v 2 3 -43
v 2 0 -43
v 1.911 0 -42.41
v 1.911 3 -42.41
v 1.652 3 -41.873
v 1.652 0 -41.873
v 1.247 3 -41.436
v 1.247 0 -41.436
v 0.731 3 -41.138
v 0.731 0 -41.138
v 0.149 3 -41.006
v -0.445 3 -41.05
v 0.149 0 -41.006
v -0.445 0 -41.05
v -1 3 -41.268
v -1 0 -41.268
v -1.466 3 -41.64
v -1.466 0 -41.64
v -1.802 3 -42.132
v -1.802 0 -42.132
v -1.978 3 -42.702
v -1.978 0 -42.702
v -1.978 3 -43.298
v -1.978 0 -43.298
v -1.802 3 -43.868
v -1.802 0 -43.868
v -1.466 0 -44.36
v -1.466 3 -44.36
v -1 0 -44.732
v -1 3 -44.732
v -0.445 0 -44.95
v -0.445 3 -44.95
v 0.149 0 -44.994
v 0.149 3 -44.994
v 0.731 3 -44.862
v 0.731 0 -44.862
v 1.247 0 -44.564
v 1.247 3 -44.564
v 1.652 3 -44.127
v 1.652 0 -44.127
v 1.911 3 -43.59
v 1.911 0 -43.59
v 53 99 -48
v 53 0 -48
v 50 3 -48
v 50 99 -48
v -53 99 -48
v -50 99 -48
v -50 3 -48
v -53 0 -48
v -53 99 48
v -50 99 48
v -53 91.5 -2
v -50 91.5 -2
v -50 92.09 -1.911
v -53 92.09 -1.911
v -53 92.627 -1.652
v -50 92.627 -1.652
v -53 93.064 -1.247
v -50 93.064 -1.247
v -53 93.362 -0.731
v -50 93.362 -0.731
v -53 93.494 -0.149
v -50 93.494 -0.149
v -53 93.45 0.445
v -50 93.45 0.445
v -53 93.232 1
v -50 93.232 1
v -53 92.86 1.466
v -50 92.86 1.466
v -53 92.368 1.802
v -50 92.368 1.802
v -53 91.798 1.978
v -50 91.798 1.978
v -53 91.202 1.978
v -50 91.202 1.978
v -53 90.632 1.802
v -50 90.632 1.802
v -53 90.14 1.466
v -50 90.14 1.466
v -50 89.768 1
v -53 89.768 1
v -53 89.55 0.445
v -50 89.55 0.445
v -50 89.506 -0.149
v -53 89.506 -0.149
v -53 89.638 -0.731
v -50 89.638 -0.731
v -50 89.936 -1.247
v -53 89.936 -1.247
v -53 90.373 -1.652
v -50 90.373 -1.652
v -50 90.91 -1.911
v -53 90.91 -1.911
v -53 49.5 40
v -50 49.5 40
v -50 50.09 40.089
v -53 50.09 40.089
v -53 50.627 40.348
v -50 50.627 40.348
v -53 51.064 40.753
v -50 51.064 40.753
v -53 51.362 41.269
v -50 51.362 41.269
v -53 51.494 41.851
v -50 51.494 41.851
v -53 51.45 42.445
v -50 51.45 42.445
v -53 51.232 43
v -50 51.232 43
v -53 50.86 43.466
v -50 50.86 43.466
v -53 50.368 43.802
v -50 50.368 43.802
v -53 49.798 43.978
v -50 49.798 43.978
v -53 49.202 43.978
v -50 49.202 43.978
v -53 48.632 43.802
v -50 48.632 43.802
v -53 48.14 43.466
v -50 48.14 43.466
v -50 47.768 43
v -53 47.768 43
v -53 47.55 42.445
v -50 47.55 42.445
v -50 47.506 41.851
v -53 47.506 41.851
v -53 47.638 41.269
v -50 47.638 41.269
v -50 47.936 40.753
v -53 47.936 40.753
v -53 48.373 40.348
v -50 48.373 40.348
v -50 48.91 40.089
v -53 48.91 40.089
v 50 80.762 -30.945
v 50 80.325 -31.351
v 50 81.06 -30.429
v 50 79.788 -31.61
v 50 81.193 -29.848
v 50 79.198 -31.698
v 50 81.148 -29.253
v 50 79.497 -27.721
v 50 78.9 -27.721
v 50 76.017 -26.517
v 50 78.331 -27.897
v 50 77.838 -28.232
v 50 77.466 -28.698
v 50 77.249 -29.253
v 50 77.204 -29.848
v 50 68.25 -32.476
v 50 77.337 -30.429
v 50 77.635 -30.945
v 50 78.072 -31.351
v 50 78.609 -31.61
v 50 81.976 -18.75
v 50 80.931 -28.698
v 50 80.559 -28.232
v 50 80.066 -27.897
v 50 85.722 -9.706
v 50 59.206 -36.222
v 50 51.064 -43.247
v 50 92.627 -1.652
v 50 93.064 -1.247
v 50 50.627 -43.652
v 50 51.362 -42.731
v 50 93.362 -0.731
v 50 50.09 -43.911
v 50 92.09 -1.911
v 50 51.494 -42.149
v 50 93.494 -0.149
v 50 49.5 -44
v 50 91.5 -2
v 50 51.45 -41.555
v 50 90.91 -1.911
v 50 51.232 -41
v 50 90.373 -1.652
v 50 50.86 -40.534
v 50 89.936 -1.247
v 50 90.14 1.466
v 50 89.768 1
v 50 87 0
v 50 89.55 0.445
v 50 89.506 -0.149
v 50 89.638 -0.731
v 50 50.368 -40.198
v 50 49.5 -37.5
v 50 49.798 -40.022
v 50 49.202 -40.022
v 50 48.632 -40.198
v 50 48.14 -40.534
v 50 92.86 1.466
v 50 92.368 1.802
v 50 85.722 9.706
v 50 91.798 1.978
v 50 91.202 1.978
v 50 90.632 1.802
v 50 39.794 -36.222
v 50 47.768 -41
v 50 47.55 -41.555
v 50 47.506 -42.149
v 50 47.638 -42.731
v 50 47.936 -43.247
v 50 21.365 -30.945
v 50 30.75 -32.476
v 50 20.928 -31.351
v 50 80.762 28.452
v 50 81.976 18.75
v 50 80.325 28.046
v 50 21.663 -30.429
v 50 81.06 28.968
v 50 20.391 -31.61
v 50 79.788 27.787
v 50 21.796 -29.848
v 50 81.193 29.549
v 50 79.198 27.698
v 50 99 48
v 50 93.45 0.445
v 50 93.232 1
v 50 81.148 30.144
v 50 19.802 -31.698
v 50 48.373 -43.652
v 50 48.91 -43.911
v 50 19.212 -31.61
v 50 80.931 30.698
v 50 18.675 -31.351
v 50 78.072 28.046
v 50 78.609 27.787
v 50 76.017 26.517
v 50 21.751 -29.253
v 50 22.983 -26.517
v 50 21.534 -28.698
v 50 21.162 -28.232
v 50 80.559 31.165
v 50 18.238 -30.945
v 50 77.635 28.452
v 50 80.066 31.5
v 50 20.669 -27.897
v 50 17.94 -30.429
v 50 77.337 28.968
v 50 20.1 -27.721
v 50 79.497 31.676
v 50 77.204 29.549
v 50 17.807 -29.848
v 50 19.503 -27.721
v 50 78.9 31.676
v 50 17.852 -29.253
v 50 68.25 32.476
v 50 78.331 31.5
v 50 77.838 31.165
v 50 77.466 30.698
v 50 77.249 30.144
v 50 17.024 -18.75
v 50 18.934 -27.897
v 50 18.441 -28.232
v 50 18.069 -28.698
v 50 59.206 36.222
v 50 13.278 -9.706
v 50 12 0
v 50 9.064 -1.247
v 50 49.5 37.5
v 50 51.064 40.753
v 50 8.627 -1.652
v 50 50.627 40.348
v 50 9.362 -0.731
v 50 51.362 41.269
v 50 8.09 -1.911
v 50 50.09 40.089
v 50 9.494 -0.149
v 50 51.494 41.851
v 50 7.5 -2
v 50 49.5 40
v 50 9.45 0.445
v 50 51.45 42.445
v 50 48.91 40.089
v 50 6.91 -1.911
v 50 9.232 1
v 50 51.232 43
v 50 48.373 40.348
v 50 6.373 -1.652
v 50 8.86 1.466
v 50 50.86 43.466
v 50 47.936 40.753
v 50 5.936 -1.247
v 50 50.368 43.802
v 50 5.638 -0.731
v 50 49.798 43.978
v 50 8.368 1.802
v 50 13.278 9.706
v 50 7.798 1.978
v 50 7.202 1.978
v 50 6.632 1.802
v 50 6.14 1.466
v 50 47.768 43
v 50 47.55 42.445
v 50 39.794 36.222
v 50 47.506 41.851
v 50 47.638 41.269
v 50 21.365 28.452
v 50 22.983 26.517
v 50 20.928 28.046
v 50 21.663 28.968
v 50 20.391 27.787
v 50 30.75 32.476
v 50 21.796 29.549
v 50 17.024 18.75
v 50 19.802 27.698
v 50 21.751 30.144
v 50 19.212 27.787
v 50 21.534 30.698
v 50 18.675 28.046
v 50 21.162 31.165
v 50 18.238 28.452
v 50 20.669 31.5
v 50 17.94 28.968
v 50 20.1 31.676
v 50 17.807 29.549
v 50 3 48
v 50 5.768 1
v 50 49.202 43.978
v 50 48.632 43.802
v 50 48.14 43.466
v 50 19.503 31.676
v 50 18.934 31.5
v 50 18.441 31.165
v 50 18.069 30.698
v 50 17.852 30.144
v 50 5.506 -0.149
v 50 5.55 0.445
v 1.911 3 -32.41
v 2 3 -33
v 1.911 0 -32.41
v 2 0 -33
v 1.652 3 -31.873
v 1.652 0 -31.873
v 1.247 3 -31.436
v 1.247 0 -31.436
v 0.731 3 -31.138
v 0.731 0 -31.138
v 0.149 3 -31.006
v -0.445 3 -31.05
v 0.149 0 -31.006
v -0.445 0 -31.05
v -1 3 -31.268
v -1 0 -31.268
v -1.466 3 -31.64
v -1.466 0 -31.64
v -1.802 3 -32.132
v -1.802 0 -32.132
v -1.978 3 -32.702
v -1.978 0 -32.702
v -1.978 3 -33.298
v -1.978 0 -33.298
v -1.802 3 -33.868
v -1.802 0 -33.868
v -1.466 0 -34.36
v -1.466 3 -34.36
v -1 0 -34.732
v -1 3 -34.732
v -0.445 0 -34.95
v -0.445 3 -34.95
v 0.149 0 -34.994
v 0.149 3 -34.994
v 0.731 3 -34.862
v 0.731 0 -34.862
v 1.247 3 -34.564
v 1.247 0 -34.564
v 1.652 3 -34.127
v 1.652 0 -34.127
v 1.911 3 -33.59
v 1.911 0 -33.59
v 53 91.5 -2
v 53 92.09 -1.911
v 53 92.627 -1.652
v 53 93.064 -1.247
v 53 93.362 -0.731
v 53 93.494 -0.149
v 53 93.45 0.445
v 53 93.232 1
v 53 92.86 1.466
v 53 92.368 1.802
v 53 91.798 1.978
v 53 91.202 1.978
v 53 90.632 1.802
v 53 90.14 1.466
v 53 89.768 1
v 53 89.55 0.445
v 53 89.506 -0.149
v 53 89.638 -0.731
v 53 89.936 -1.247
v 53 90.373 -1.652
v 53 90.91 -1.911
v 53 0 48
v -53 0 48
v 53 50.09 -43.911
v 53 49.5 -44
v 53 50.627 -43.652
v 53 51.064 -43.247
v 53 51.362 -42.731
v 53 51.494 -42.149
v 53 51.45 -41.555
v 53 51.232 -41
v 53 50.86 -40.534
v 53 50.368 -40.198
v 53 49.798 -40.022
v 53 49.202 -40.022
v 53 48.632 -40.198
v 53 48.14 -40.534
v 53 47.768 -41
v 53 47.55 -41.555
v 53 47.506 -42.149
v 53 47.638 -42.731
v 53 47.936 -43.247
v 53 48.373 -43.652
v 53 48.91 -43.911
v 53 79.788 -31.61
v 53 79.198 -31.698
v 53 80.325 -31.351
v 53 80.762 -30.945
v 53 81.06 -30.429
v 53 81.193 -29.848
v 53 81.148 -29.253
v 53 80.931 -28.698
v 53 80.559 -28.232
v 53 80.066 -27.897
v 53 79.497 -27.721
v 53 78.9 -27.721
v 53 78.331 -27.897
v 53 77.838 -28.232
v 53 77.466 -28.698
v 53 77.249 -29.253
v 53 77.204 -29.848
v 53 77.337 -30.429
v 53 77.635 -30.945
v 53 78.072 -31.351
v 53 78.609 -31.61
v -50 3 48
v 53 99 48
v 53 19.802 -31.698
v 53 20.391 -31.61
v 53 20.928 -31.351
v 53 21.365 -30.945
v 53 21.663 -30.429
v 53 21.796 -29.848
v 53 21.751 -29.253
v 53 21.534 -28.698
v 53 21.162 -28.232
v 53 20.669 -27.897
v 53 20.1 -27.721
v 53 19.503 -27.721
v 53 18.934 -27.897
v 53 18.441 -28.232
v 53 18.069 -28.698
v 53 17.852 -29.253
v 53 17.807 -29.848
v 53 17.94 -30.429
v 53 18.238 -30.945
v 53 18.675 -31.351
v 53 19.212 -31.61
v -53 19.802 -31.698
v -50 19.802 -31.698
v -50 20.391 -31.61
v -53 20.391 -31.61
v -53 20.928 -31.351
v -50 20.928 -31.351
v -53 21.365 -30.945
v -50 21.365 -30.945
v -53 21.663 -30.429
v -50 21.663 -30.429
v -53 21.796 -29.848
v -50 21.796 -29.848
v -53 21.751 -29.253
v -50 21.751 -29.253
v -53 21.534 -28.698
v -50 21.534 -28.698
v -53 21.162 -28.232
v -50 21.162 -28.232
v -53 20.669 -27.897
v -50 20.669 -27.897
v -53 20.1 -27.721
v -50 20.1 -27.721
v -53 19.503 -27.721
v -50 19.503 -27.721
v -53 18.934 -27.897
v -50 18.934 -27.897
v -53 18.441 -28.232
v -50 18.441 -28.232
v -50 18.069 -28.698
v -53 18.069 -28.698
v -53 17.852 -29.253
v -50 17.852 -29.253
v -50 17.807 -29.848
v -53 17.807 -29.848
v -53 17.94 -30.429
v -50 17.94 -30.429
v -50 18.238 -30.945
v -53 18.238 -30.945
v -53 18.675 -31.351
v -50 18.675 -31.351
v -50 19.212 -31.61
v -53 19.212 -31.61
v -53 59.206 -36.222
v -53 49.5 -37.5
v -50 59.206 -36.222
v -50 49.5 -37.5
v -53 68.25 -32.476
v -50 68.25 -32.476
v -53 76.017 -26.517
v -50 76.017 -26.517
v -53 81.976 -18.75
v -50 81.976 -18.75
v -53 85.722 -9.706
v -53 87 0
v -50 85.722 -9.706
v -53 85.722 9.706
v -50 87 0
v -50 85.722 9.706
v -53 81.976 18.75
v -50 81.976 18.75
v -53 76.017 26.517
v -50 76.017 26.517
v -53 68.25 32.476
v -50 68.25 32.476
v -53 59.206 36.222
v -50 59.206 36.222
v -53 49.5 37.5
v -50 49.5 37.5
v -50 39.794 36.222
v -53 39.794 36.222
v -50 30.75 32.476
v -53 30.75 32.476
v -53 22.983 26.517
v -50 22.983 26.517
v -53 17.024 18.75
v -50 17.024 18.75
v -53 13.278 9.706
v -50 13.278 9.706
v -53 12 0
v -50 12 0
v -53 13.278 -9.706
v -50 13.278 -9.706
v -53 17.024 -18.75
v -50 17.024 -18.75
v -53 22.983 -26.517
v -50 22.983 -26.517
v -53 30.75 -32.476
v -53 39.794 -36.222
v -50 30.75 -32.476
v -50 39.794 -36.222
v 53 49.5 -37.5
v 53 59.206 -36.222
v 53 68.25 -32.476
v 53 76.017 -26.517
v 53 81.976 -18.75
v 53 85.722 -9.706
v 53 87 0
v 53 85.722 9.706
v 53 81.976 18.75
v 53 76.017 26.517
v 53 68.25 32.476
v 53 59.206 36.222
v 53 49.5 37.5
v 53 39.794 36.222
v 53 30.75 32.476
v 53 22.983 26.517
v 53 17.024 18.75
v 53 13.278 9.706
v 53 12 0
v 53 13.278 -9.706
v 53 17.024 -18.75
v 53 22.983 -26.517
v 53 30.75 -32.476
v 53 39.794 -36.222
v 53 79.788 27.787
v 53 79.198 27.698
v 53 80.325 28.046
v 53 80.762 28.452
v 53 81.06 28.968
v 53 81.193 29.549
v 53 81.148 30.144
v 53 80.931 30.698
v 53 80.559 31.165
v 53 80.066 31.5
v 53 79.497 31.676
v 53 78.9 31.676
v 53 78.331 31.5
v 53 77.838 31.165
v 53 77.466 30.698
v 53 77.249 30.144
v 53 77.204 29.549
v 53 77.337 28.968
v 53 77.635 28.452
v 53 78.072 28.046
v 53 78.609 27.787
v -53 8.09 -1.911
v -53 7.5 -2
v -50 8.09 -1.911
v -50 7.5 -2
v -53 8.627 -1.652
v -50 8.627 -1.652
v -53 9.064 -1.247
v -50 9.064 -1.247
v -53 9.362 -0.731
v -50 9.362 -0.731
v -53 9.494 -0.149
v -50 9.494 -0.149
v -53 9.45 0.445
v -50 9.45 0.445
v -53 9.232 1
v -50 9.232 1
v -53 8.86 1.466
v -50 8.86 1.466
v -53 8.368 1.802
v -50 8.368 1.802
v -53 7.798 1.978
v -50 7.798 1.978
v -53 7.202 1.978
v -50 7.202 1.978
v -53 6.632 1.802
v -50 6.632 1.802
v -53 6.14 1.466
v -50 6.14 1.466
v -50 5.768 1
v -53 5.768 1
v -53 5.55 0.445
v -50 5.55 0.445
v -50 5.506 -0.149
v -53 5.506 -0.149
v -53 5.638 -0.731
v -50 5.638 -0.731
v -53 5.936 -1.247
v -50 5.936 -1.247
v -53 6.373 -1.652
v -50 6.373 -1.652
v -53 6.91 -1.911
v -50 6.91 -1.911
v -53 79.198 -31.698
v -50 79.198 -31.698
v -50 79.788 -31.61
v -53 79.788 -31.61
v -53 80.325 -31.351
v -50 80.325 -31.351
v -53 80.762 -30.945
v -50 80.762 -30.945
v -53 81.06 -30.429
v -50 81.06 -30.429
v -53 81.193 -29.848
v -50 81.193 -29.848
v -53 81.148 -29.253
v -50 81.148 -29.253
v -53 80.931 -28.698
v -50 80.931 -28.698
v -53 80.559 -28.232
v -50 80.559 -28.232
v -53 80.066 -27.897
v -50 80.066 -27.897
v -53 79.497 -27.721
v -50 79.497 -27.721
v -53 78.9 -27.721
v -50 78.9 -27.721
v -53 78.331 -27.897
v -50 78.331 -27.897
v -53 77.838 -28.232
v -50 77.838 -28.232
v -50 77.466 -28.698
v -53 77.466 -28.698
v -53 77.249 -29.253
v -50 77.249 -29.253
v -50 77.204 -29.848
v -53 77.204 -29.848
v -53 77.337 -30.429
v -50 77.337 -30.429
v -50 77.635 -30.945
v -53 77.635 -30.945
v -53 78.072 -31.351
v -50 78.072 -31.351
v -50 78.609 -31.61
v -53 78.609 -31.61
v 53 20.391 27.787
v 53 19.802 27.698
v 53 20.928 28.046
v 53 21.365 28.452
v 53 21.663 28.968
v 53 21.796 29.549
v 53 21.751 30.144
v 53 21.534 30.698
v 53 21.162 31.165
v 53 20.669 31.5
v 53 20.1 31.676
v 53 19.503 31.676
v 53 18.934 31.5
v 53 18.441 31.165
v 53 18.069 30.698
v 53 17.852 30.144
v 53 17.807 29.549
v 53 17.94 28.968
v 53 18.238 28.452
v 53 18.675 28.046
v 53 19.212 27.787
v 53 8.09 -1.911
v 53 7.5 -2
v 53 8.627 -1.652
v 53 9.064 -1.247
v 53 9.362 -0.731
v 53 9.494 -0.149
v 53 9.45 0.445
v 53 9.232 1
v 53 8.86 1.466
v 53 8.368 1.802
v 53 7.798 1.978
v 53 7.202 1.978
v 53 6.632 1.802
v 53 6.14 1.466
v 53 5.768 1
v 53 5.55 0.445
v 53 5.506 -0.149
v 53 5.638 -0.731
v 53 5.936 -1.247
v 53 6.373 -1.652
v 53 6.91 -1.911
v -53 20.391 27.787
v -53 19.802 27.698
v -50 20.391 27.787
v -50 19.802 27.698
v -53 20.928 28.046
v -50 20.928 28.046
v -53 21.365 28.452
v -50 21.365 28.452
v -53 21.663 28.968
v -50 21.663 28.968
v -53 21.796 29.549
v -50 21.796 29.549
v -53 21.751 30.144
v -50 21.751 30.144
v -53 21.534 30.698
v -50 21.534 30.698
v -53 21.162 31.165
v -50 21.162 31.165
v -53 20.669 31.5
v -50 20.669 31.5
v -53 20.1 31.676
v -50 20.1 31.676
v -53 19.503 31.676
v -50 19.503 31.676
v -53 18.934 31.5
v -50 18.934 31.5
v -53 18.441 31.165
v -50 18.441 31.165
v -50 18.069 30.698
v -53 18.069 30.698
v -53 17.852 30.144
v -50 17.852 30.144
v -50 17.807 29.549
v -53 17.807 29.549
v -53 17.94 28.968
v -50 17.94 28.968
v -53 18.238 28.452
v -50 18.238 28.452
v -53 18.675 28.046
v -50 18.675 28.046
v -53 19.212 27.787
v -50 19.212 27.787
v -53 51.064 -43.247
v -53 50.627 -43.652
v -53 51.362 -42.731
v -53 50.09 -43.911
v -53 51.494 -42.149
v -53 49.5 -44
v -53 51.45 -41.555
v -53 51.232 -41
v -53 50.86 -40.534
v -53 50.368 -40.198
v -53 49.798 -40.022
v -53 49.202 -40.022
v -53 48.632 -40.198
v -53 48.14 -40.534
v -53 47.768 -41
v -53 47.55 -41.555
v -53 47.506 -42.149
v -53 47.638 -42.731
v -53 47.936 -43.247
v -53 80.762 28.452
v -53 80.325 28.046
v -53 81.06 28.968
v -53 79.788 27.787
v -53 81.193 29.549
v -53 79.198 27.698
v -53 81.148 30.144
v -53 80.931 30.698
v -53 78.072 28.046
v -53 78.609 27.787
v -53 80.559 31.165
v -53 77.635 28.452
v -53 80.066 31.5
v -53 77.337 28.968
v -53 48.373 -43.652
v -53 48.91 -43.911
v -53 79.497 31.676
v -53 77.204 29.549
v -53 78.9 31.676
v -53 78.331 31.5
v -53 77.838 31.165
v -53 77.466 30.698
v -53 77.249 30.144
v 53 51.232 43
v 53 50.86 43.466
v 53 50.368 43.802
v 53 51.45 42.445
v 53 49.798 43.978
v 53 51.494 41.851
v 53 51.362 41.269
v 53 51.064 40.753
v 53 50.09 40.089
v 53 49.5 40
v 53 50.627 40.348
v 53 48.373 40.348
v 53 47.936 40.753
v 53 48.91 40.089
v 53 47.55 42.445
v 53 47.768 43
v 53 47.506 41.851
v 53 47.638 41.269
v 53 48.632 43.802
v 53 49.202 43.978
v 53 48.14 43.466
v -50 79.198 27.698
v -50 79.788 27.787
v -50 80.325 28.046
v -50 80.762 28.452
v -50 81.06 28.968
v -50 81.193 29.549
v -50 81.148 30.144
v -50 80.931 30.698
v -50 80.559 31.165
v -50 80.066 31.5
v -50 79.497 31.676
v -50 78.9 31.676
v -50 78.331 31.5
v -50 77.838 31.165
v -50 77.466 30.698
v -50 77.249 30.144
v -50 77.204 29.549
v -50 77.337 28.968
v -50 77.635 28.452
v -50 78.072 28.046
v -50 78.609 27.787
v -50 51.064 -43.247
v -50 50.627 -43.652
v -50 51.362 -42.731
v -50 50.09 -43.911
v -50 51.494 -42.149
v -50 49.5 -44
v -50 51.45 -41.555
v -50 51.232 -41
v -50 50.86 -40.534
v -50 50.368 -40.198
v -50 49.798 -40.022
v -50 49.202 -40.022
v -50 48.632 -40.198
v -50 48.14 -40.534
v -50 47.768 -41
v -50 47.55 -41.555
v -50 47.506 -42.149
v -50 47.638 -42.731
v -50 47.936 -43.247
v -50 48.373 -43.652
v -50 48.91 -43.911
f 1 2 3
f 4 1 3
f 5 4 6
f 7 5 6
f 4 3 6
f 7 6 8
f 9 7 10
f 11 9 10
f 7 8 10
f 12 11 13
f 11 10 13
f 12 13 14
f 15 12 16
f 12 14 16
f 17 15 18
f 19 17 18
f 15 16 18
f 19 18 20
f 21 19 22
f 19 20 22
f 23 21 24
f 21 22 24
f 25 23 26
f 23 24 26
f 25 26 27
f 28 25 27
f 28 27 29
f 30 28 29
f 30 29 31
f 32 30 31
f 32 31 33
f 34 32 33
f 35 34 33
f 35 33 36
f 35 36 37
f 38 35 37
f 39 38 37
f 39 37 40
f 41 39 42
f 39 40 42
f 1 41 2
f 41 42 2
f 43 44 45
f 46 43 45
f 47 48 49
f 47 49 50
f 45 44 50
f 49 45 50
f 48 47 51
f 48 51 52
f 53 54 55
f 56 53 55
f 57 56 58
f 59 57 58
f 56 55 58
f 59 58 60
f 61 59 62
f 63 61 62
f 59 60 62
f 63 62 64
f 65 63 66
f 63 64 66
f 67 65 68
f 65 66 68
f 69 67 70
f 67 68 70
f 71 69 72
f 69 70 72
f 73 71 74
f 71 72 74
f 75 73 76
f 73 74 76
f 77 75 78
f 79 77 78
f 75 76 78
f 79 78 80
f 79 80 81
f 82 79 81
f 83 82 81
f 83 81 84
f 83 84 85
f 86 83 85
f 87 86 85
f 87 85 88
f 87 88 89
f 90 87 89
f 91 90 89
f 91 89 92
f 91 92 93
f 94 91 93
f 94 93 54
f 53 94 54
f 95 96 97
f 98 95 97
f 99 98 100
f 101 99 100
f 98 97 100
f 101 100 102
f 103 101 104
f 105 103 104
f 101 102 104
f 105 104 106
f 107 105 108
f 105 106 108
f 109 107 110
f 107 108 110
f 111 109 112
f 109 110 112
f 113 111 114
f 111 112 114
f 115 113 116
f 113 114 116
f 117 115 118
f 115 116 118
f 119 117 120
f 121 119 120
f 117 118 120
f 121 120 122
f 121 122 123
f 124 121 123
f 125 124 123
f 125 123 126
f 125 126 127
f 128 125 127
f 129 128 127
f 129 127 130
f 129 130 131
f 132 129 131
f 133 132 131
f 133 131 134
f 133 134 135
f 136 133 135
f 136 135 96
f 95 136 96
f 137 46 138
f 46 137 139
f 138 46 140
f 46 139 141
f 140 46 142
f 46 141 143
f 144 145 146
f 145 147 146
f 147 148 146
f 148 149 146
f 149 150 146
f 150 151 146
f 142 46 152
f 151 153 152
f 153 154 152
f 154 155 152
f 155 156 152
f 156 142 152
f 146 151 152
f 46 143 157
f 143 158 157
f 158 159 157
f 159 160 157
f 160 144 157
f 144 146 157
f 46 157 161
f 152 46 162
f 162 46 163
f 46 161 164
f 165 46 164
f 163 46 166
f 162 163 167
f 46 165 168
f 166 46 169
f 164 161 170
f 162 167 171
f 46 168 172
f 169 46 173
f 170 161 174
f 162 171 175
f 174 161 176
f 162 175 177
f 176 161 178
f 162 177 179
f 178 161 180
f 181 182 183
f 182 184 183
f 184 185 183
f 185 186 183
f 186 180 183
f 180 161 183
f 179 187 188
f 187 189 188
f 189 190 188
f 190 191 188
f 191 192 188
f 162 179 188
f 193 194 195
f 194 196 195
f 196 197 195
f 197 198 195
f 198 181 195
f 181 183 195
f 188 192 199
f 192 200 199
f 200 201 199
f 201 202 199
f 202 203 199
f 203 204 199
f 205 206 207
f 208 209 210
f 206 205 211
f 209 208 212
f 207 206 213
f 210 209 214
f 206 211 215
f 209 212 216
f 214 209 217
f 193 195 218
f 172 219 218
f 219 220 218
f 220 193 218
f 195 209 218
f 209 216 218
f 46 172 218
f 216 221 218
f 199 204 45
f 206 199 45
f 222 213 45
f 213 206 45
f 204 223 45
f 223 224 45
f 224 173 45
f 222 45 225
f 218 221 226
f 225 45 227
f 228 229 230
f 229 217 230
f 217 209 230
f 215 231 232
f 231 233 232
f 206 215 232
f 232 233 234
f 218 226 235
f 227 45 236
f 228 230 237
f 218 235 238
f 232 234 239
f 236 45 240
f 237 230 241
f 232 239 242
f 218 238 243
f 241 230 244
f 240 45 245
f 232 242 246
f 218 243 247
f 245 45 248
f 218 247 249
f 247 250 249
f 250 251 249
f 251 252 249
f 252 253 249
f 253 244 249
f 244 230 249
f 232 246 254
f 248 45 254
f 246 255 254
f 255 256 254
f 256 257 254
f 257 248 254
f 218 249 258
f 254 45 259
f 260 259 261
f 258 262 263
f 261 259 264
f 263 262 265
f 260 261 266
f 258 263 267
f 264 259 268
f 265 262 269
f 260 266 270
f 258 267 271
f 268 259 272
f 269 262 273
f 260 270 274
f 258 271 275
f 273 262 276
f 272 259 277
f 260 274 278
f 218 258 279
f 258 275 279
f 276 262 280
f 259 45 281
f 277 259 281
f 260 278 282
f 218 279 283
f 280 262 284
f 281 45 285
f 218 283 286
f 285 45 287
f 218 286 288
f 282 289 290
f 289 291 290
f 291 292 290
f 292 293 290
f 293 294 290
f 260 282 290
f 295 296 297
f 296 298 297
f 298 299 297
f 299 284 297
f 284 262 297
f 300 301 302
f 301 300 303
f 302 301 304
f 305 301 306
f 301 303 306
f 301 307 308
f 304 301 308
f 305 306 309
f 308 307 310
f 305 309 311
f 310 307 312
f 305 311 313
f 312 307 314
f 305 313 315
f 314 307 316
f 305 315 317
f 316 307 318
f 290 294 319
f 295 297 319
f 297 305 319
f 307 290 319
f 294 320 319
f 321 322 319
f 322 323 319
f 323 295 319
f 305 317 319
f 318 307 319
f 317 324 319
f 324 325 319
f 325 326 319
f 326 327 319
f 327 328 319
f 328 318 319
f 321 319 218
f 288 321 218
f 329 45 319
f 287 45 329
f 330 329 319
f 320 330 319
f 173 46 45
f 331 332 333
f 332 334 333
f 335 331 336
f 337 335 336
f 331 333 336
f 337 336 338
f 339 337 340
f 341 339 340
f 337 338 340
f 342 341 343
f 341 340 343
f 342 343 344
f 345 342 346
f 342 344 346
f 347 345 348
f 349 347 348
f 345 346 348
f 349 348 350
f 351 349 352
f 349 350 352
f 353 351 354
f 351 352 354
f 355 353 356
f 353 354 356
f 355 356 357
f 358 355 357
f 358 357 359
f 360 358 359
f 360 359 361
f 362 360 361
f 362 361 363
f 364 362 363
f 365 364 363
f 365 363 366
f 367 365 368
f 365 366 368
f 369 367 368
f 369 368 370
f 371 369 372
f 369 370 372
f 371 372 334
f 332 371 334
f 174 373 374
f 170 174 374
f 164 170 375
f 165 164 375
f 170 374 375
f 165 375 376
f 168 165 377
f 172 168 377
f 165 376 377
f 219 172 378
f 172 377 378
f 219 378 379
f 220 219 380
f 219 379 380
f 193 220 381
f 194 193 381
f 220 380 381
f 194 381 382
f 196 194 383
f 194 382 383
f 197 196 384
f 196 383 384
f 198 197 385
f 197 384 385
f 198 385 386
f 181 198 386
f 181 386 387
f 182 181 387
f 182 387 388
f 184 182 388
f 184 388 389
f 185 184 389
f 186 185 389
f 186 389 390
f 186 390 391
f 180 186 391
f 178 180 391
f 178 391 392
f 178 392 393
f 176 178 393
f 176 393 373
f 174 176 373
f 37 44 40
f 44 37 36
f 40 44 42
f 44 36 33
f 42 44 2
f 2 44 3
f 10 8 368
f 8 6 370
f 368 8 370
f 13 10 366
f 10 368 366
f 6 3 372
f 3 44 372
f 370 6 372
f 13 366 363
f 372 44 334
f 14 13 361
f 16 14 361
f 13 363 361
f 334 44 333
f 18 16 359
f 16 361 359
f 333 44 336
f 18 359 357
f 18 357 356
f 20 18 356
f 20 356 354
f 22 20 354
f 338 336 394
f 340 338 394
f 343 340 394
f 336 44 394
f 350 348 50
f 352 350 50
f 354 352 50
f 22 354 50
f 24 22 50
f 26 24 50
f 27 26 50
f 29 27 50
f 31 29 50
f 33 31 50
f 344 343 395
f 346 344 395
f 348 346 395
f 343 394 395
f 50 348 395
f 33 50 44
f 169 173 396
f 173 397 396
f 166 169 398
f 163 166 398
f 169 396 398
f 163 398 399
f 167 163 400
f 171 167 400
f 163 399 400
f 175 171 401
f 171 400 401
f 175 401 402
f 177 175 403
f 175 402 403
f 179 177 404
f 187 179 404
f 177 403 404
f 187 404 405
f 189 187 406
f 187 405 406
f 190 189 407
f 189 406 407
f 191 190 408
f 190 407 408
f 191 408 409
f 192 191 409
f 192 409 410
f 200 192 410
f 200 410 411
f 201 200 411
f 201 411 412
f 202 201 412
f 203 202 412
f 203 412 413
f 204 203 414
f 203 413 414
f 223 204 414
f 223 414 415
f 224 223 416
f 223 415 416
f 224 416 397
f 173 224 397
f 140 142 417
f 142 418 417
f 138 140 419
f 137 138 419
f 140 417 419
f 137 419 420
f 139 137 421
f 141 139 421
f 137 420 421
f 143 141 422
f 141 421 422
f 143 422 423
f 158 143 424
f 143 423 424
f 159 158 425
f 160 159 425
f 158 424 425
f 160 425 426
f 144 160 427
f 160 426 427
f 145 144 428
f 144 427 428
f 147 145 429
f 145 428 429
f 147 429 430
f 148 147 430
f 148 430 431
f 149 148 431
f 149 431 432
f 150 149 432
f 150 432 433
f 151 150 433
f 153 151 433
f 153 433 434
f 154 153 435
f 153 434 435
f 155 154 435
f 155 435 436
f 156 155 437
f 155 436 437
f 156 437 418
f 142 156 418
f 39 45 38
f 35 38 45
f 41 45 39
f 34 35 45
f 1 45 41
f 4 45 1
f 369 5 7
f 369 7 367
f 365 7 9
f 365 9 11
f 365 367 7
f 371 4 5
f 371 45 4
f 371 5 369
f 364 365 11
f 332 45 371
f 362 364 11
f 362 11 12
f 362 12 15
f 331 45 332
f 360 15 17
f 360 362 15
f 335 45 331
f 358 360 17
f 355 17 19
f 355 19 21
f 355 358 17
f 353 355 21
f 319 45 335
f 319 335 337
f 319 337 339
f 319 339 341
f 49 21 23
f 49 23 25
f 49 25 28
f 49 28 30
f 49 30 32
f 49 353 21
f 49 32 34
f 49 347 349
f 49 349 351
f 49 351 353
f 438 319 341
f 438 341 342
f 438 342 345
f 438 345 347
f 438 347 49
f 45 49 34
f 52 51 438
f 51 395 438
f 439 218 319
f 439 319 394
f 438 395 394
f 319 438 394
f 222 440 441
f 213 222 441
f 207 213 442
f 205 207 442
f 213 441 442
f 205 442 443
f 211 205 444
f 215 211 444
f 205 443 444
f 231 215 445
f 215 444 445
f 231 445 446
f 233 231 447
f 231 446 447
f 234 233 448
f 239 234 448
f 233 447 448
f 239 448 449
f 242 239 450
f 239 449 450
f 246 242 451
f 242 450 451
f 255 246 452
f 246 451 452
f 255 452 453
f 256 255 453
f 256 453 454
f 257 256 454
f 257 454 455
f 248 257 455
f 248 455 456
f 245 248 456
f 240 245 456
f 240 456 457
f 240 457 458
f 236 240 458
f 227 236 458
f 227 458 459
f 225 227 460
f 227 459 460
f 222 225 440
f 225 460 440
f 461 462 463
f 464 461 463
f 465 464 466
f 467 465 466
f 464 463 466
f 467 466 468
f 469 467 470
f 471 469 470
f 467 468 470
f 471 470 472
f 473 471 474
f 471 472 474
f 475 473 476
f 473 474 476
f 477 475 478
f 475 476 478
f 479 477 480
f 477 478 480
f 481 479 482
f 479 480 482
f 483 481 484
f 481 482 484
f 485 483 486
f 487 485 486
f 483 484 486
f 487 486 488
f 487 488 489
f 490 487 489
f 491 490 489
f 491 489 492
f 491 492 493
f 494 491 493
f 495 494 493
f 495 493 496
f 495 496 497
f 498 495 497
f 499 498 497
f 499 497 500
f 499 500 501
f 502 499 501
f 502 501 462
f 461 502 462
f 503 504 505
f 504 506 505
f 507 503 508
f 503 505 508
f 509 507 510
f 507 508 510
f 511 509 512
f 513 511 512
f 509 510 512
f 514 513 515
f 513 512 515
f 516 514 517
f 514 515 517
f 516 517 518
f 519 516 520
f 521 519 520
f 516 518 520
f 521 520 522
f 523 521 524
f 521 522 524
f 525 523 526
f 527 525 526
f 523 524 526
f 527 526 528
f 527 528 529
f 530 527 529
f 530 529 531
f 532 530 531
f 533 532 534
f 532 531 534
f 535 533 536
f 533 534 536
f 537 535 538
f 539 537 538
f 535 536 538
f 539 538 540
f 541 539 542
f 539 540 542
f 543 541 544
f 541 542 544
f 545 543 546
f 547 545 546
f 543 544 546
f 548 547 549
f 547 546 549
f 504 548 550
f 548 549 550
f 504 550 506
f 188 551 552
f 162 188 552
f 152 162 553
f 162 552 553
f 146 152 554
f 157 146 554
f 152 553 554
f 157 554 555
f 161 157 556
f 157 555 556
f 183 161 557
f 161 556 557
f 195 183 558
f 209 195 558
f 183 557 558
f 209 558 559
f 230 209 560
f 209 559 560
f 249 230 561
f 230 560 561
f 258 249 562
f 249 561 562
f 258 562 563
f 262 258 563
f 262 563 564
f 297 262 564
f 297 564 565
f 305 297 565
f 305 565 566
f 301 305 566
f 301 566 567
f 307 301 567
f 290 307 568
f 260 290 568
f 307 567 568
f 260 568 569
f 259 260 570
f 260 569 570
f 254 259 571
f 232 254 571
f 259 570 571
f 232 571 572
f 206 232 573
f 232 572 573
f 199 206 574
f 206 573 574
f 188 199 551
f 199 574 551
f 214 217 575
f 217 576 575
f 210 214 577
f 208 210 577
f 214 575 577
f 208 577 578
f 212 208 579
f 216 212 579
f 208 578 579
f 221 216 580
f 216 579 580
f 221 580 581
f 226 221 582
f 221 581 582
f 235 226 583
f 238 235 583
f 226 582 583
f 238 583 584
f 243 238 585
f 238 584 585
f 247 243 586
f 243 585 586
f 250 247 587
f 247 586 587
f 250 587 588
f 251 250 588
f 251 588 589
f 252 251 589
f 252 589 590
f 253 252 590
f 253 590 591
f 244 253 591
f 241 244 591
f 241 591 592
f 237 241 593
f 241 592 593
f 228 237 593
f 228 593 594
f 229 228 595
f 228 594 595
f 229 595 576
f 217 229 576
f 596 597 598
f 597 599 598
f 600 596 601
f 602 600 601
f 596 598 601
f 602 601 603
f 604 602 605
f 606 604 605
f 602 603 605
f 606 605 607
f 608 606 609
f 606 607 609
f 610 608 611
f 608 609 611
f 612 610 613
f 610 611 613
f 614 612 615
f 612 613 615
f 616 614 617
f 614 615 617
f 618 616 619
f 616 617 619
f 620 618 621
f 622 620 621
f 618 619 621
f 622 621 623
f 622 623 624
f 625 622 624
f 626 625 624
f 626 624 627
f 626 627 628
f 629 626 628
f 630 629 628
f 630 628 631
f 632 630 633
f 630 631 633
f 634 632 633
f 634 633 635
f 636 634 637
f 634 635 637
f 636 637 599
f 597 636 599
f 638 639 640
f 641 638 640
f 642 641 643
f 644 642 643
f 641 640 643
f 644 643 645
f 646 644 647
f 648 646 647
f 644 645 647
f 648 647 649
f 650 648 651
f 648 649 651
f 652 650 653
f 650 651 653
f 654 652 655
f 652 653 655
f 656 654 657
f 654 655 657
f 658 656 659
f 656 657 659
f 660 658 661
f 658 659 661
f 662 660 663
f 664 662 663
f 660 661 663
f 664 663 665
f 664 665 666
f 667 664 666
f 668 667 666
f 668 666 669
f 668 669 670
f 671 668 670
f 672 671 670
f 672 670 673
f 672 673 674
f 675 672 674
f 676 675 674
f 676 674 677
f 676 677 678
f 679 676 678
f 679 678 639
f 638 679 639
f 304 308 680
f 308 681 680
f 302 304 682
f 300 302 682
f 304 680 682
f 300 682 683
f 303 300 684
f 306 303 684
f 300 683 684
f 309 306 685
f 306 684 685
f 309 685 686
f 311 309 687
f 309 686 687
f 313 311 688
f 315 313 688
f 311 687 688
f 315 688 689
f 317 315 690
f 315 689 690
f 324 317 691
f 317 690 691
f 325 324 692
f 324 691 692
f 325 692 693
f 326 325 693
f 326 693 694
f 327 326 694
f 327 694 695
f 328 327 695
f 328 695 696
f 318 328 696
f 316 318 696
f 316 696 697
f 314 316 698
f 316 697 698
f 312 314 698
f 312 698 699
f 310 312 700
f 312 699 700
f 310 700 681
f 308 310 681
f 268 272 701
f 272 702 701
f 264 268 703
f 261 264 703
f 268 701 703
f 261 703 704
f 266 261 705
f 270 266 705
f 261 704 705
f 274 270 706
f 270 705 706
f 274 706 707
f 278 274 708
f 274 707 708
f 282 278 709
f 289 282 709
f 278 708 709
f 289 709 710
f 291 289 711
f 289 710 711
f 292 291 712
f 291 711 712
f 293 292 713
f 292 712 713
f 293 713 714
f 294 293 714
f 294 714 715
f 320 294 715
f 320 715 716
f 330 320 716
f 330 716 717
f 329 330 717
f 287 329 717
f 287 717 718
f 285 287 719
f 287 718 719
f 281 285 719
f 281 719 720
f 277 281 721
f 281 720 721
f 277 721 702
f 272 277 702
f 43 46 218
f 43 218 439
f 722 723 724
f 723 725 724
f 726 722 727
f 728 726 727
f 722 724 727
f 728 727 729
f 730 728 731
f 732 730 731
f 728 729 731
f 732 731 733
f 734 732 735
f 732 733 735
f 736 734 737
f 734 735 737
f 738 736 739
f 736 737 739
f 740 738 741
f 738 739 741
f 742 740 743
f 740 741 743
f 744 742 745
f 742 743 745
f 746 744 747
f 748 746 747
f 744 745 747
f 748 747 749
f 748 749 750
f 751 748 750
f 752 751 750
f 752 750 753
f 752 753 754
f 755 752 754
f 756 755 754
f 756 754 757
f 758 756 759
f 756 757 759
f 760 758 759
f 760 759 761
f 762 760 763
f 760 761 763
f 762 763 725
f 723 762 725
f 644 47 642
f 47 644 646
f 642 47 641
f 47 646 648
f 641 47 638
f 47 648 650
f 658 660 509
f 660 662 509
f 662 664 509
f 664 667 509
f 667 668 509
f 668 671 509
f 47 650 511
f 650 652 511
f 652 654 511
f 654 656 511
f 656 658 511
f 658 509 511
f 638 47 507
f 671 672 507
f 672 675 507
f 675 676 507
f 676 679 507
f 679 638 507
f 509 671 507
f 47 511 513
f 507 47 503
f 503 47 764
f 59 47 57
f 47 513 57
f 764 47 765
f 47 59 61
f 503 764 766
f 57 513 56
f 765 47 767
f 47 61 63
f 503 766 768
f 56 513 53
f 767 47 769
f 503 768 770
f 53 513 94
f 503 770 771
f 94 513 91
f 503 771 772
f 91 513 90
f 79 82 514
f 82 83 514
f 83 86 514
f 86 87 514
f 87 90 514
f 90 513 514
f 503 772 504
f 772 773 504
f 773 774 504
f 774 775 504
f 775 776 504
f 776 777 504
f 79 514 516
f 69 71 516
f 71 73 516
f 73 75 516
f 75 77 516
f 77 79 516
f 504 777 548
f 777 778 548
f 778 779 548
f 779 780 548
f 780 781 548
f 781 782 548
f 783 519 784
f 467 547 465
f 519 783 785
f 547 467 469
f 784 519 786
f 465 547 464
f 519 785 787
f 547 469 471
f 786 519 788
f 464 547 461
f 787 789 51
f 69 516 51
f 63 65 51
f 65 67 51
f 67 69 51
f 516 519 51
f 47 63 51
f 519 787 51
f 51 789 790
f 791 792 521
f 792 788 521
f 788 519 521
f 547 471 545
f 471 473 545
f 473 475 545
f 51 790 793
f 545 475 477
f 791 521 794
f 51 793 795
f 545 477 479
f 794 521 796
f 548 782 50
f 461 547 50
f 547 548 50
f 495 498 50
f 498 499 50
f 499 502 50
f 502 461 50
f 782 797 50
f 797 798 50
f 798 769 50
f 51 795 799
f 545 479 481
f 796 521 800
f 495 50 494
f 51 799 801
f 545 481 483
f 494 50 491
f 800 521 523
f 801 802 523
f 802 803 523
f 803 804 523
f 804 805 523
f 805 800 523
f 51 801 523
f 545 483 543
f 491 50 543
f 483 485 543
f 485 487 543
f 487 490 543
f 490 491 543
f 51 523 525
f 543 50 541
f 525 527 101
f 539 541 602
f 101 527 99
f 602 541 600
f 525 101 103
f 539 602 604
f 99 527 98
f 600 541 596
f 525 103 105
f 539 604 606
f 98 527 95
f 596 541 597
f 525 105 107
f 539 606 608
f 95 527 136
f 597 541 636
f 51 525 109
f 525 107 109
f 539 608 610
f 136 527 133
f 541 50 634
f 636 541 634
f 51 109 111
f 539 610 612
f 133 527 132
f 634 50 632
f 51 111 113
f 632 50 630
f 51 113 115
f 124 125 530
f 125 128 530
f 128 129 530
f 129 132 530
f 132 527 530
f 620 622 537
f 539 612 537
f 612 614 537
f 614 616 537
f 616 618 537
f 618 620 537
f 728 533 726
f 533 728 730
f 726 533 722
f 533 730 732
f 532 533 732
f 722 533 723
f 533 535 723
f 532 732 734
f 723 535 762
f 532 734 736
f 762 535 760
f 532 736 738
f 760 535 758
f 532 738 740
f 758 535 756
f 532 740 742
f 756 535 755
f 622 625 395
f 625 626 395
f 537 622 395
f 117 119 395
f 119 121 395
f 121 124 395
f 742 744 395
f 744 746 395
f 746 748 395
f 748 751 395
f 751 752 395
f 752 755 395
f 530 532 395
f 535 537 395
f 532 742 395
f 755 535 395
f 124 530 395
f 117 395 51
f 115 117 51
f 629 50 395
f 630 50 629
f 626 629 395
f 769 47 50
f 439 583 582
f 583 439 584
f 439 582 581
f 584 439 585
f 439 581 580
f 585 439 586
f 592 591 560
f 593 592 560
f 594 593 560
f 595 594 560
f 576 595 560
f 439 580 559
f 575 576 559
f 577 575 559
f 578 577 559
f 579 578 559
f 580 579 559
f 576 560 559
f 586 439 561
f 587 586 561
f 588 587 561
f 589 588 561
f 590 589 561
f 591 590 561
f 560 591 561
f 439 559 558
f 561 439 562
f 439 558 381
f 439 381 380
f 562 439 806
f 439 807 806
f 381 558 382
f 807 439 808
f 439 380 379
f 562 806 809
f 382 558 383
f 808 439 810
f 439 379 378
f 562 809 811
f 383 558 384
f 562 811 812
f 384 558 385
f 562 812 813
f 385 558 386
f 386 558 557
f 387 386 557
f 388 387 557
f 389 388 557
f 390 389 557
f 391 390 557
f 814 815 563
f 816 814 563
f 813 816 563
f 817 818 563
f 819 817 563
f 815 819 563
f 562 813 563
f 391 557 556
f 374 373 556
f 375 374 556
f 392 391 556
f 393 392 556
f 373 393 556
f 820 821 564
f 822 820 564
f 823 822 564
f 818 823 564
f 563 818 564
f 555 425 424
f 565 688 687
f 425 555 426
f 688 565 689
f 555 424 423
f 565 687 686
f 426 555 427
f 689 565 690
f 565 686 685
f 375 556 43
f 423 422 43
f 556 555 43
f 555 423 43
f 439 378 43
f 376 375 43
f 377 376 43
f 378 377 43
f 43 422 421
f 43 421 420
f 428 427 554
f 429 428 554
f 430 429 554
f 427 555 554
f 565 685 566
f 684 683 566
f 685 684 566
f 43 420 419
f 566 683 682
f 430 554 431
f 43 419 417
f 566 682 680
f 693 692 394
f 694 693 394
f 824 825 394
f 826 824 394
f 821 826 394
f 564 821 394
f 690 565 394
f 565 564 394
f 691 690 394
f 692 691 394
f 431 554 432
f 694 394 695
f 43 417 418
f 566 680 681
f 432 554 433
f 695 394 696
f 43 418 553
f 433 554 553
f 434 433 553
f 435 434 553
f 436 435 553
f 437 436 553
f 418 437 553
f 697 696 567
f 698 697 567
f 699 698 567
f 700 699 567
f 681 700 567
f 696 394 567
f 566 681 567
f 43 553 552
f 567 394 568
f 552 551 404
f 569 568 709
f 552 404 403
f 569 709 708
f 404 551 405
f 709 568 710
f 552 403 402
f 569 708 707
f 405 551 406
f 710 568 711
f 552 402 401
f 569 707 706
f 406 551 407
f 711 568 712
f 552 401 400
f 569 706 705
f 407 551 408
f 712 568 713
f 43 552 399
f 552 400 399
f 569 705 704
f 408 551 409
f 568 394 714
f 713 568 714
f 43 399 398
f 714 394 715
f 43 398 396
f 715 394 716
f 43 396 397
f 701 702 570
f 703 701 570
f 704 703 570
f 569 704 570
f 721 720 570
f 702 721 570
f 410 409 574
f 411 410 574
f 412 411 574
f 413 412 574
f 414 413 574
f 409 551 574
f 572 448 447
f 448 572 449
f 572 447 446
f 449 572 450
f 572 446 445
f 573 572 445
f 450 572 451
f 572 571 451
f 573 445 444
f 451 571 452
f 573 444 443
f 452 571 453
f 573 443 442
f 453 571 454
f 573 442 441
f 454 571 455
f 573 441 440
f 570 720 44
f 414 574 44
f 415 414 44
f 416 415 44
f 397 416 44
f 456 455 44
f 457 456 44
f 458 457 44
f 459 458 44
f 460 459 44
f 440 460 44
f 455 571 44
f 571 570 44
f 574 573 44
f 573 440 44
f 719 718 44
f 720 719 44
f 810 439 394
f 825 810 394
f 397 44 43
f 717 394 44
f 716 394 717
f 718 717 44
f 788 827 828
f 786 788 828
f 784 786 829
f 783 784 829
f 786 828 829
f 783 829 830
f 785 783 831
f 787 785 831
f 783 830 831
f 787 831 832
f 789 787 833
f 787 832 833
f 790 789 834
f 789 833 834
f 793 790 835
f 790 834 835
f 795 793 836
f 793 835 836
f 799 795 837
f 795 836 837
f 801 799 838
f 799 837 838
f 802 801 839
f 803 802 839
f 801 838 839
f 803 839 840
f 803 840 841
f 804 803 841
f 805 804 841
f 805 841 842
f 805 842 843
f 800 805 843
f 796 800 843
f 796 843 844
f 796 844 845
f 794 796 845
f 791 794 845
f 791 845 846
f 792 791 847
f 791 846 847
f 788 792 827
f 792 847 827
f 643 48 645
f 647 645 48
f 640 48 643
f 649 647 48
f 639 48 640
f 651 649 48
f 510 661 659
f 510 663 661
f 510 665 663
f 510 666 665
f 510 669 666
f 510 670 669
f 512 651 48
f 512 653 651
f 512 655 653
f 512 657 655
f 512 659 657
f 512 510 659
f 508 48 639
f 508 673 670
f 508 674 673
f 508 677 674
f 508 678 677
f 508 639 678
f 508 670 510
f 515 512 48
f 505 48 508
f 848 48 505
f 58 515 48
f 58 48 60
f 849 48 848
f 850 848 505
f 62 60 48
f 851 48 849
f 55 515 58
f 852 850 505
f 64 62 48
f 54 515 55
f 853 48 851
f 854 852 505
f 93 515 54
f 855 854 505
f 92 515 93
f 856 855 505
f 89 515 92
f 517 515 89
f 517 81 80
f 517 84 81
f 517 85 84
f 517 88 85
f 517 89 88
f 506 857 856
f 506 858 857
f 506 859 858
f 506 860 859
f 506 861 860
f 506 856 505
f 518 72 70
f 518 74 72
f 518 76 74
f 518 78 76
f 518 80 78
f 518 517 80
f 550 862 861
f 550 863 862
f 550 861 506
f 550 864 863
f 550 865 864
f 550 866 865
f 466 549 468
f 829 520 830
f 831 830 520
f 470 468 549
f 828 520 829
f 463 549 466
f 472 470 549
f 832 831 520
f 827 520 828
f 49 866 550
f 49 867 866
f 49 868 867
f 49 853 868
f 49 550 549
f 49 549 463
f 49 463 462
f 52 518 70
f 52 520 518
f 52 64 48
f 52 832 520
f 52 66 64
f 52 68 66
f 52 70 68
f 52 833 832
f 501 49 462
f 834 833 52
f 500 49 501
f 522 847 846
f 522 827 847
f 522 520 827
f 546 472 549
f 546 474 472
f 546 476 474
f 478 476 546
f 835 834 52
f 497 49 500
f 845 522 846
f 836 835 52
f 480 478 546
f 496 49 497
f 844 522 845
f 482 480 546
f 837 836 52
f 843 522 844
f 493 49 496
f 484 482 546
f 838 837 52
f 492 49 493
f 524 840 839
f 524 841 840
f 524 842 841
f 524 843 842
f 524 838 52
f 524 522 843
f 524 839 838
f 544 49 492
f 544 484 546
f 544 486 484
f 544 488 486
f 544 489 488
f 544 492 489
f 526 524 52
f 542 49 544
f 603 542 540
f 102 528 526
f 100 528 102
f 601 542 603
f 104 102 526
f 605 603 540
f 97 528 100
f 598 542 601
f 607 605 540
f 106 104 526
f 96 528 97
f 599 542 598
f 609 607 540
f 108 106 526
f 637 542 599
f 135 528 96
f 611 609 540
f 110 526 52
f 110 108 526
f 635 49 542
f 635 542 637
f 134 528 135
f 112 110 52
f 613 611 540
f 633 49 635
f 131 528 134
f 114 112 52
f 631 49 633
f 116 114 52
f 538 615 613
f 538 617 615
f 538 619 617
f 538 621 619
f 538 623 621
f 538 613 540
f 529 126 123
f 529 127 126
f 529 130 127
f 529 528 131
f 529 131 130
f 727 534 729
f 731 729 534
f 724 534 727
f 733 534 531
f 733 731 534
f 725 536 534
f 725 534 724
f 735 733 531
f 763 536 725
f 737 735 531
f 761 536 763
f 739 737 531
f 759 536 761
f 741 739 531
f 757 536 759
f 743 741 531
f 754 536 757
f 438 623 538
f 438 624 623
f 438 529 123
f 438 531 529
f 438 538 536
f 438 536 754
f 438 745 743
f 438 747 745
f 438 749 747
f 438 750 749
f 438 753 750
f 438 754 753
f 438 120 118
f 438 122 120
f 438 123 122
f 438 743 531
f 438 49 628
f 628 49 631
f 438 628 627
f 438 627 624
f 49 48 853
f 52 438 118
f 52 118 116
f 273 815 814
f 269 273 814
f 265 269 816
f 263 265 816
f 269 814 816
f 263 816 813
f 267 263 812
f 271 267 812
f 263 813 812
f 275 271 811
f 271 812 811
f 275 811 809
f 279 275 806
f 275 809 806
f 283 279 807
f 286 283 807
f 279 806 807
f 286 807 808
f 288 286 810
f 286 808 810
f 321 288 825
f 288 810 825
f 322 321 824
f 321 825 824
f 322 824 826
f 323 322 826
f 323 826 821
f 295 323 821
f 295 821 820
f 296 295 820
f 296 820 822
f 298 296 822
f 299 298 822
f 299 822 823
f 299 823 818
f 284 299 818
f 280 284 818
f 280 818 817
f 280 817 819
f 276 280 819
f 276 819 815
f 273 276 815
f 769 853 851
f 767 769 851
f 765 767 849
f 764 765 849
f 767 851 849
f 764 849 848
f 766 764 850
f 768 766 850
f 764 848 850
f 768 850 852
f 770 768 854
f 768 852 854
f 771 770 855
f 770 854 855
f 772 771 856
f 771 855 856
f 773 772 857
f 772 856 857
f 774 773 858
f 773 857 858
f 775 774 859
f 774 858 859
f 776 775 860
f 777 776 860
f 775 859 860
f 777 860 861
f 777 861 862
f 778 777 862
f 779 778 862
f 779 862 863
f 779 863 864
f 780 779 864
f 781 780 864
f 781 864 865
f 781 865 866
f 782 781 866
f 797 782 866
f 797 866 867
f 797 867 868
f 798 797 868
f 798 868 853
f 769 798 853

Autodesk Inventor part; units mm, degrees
ref_plane "YZ Plane" through (0, 0, 0) normal (1, 0, 0) x (0, 1, 0)
ref_plane "XZ Plane" through (0, 0, 0) normal (0, 1, 0) x (-1, 0, 0)
ref_plane "XY Plane" through (0, 0, 0) normal (0, 0, 1) x (1, 0, 0)
sketch "Sketch2" plane through (0, 0, 0) normal (0, 1, 0) x (-1, 0, 0)
  line L0 (53, 48) -> (-53, 48)
  line L1 (-53, 48) -> (-53, -48)
  line L2 (-53, -48) -> (53, -48)
  line L3 (53, -48) -> (53, 48)
  line L4 (53, 48) -> (-53, -48) construction
  line L5 (-53, 48) -> (53, -48) construction
  point P0 (0, 0)
  dimension "d20" = 106
  dimension "d21" = 96
extrude "Extrusion1" add sketch "Sketch2" along normal blind 3
sketch "Sketch4" plane through (0, 3, 0) normal (0, 1, 0) x (1, 0, 0)
  line L0 (53, -48) -> (53, 48) projected
  line L1 (-53, -48) -> (53, -48) projected
  line L2 (53, 48) -> (50, 48)
  line L3 (50, 48) -> (50, -48)
  line L4 (50, -48) -> (53, -48)
  line L5 (53, -48) -> (53, 48)
  line L6 (53, 48) -> (-53, 48) projected
  line L7 (-53, 48) -> (-50, 48)
  line L8 (-50, 48) -> (-50, -48)
  line L9 (-50, -48) -> (-53, -48)
  line L10 (-53, -48) -> (-53, 48)
  point P0 (0, 0)
  dimension "d22" = 3
  dimension "d45" = 3
extrude "Extrusion3" add sketch "Sketch4" along normal blind 96 contours L1 L3 L2 L0 | L1 L10 L6 L8
sketch "Sketch5" plane through (53, 0, 48) normal (1, 0, 0) x (0, 0, -1)
  line L0 (48, 99) -> (48, 0) construction
  line L1 (0, 99) -> (96, 99) projected
  circle A0 centre (48, 49.5) radius 37.5
  dimension "d27" = 75
extrude "Extrusion4" cut sketch "Sketch5" against normal blind 164.2625
sketch "Sketch6" plane through (53, 0, 48) normal (1, 0, 0) x (0, 0, -1)
  circle A0 centre (48, 49.5) radius 37.5 projected
  circle A1 centre (48, 49.5) radius 42 construction
  circle A2 centre (90, 49.5) radius 2
  circle A3 centre (48, 49.5) radius 42 construction
  circle A4 centre (77.6985, 79.1985) radius 2
  circle A5 centre (48, 49.5) radius 42 construction
  circle A6 centre (48, 91.5) radius 2
  circle A7 centre (48, 49.5) radius 42 construction
  circle A8 centre (18.3015, 79.1985) radius 2
  circle A9 centre (48, 49.5) radius 42 construction
  circle A10 centre (6, 49.5) radius 2
  circle A11 centre (48, 49.5) radius 42 construction
  circle A12 centre (18.3015, 19.8015) radius 2
  circle A13 centre (48, 49.5) radius 42 construction
  circle A14 centre (48, 7.5) radius 2
  circle A15 centre (48, 49.5) radius 42 construction
  circle A16 centre (77.6985, 19.8015) radius 2
  point P0 (48, 0)
  dimension "d30" = 84
  dimension "d31" = 4
  dimension "d34" = 360
extrude "Extrusion5" cut sketch "Sketch6" against normal blind 164.2625 contours A2 | A4 | A6 | A8 | A10 | A12 | A14 | A16
sketch "Sketch7" plane through (0, 0, 0) normal (0, -1, 0) x (1, 0, 0)
  line L0 (53, -48) -> (-53, -48) projected
  line L1 (0, -48) -> (0, -43) construction
  line L2 (0, -43) -> (0, -33) construction
  circle A0 centre (0, -43) radius 2
  circle A1 centre (0, -33) radius 2
  point P0 (0, 0)
  dimension "d38" = 5
  dimension "d39" = 10
  dimension "d40" = 4
  dimension "d41" = 4
extrude "Extrusion6" cut sketch "Sketch7" against normal blind 4
properties part number "shoulder"
